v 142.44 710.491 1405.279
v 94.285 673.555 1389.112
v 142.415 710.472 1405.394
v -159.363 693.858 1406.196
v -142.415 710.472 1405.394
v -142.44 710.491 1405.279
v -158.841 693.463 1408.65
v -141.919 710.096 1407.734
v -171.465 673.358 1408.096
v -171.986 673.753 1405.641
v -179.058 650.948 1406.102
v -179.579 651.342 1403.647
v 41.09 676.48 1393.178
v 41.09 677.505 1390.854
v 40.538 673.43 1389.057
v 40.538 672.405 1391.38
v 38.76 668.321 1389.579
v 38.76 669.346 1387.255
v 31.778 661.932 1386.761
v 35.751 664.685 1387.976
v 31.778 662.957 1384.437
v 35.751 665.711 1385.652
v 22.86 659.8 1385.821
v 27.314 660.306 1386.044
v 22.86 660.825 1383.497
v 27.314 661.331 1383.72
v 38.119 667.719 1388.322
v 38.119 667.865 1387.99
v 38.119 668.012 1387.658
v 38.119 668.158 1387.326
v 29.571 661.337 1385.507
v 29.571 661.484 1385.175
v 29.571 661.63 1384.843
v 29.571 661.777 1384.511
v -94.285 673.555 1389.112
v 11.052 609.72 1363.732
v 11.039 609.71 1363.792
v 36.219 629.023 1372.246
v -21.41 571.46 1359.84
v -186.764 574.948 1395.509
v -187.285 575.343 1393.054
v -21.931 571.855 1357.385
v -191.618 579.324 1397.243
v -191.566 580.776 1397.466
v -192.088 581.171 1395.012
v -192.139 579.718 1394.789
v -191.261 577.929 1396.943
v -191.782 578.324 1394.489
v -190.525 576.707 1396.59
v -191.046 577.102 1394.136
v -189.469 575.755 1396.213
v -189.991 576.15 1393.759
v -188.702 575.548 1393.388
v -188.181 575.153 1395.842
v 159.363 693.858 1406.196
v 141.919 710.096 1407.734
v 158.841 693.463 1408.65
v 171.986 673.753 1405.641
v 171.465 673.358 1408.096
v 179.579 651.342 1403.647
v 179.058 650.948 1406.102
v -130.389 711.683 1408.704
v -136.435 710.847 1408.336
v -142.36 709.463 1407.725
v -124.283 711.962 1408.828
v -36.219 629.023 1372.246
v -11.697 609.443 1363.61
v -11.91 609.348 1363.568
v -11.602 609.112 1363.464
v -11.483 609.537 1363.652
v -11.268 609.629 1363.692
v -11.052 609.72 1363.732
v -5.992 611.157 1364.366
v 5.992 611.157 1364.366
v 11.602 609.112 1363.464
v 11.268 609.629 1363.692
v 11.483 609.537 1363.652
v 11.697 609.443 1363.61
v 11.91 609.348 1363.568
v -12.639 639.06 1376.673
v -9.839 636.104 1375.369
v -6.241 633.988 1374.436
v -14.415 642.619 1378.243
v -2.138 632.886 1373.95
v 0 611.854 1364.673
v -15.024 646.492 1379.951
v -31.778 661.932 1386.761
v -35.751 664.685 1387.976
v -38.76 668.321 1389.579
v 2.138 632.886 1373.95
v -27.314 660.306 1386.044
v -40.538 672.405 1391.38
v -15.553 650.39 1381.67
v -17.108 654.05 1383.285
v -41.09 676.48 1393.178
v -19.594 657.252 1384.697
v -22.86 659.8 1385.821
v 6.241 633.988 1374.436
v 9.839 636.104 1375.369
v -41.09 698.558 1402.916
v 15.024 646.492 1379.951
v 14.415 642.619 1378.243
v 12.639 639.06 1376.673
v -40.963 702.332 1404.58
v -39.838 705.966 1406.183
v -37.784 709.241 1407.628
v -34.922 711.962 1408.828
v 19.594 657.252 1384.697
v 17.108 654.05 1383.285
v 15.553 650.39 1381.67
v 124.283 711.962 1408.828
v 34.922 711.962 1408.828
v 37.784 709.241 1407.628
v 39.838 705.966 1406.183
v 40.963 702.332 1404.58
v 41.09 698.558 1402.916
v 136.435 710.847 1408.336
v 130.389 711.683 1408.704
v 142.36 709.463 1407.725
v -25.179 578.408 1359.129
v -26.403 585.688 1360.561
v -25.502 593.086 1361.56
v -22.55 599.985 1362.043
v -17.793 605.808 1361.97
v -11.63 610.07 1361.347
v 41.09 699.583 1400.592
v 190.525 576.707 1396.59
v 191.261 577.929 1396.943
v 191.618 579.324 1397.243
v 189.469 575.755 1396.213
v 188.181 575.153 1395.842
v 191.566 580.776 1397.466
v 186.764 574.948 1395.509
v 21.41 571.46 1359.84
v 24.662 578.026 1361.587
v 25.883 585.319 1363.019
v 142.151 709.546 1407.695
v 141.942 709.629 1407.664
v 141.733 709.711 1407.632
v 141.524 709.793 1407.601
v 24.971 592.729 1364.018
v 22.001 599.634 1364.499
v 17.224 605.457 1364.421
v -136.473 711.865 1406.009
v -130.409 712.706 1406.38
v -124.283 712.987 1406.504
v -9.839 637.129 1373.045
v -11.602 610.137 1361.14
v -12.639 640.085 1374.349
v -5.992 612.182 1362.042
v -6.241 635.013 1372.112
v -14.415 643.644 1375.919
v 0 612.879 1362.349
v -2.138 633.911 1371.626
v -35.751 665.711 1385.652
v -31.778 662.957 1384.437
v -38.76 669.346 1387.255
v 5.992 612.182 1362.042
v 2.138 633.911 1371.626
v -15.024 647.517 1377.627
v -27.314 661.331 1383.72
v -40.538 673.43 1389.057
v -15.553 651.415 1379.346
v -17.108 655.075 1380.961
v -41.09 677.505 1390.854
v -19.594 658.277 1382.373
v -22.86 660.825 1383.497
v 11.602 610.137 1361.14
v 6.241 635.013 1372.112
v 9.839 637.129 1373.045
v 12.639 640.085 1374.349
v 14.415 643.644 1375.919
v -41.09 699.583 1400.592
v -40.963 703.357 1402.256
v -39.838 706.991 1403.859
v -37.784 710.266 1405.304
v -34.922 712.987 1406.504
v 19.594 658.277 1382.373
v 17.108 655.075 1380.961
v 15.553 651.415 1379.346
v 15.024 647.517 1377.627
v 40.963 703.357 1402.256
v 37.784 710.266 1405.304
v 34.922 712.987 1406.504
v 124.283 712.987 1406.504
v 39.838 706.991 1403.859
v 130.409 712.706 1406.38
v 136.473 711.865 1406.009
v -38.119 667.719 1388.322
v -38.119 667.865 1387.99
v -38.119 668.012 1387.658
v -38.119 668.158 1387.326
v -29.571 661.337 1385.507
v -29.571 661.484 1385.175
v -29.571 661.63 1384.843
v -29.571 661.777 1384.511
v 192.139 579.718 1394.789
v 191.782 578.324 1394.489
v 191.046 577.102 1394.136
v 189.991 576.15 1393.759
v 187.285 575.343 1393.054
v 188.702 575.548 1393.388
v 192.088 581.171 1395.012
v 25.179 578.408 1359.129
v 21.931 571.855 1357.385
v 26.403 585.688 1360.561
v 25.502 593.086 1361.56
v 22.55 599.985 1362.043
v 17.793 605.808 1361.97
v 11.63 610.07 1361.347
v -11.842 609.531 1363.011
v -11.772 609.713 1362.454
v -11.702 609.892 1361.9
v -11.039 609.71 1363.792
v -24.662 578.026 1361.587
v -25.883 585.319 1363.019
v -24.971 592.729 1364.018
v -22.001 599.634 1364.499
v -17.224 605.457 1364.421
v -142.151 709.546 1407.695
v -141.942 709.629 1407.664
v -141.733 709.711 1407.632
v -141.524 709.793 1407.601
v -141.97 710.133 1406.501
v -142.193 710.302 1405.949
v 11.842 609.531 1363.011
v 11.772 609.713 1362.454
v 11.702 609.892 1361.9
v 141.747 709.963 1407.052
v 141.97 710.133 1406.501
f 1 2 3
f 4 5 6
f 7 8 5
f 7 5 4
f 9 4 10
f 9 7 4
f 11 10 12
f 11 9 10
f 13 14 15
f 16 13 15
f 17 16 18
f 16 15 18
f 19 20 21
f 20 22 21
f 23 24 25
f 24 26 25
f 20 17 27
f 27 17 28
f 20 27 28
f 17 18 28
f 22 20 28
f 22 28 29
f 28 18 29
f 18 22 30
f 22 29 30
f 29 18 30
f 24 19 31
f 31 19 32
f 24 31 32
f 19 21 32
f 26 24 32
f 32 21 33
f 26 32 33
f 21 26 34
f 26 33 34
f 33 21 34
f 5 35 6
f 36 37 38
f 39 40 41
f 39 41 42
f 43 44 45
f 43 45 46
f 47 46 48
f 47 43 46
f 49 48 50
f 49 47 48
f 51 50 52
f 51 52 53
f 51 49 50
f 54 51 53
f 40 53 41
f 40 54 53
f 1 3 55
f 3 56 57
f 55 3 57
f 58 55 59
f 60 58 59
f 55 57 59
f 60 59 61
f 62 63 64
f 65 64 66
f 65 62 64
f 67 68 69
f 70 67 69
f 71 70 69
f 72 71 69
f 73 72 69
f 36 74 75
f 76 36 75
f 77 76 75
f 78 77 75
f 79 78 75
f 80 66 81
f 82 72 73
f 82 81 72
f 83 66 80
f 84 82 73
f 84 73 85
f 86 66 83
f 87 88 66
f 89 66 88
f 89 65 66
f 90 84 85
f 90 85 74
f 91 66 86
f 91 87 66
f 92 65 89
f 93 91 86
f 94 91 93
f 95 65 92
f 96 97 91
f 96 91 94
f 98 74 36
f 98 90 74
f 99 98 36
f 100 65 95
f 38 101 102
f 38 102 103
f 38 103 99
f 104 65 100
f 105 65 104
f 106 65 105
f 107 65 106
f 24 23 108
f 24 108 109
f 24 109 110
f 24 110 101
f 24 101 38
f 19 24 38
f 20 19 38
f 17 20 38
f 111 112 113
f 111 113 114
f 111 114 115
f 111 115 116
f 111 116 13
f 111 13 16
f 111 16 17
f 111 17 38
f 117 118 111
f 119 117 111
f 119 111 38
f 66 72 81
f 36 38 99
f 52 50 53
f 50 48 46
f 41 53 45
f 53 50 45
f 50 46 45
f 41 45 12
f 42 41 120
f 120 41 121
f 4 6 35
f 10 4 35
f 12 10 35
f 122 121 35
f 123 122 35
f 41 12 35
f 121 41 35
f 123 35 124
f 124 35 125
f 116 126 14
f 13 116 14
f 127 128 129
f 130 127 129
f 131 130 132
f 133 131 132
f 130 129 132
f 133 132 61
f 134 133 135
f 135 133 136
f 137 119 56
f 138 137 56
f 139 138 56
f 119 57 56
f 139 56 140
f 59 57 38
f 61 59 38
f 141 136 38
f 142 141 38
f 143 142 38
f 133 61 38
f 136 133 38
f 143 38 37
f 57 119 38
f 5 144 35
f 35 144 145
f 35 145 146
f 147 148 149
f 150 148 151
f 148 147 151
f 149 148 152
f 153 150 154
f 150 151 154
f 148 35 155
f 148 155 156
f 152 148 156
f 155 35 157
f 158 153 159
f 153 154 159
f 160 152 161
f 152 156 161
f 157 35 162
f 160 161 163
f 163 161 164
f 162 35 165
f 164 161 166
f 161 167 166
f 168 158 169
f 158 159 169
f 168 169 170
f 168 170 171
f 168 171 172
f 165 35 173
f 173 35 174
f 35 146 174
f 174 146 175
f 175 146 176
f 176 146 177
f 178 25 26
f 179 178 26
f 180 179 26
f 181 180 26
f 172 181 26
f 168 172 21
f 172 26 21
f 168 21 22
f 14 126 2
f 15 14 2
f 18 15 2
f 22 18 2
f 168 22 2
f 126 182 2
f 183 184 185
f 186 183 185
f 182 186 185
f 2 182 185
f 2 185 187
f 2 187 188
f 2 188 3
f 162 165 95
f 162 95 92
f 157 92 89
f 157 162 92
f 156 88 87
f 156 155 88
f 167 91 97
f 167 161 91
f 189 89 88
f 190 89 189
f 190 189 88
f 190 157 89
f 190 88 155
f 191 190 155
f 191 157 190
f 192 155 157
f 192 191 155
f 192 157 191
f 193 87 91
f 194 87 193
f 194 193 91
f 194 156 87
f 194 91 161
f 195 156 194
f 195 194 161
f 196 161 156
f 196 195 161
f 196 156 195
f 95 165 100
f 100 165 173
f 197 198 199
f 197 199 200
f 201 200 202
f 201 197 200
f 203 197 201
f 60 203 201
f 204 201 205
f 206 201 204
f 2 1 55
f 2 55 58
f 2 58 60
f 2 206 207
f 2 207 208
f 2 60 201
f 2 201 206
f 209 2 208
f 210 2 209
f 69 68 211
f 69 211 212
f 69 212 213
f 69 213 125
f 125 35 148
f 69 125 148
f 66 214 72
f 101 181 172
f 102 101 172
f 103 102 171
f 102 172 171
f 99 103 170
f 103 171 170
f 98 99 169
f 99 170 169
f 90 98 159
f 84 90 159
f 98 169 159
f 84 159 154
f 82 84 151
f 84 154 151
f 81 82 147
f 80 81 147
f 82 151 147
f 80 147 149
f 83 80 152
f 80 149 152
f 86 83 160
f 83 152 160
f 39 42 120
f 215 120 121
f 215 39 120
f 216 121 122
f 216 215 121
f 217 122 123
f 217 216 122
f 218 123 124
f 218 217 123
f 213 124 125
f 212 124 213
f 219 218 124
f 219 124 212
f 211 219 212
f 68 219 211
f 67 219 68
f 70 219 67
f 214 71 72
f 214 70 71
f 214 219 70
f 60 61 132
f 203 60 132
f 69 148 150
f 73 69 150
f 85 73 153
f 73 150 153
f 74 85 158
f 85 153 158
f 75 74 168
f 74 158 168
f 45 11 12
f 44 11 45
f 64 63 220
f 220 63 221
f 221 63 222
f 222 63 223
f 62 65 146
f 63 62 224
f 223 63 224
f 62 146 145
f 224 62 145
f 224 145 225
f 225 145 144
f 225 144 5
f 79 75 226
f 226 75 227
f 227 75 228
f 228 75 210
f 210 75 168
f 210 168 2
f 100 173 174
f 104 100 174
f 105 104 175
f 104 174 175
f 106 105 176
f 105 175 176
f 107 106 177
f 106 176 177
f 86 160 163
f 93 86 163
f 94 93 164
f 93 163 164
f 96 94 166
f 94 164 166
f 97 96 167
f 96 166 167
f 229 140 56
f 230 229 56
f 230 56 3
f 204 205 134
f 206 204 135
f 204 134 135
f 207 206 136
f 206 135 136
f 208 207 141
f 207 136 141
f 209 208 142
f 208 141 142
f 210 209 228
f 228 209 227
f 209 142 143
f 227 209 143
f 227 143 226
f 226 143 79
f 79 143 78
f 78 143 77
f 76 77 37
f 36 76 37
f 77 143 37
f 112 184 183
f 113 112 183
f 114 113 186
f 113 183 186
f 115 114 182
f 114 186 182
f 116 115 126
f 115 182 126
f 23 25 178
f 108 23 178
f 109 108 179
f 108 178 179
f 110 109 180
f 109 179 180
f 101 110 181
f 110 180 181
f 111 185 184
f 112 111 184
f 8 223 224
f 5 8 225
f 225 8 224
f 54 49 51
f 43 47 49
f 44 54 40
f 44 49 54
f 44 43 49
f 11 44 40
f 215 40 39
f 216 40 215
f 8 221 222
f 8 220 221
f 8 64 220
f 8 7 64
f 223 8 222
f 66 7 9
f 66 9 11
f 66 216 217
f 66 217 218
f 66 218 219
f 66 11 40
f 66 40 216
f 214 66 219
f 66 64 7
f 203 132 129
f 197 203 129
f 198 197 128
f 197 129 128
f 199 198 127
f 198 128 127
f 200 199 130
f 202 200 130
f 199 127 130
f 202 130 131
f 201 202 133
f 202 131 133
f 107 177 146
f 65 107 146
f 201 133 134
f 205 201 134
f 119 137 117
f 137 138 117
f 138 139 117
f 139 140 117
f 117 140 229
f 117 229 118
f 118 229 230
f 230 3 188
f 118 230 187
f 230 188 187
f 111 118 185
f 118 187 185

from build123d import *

# Parameters (mm, degrees)
BOSS_EXTRUDE1_DEPTH = 2.54
BOSS_EXTRUDE2_DEPTH = 2.54


with BuildPart() as part:
    # Sketch1 → Boss-Extrude1 (new body)
    with BuildSketch(Plane(origin=(0, -403.215393304, 914.186019304), x_dir=(1, 0, 0), z_dir=(0, -0.403554778, 0.914955486))):
        with BuildLine():
            Line((41.090457211, 1205.302750155), (41.090457211, 1181.172750155))
            add(Edge.make_bspline(
                [(41.090457211, 1181.172750155), (41.090457211, 1179.500406586), (40.786106444, 1177.855480514), (40.627250629, 1176.996911717), (40.38674257, 1176.156490093), (40.140401941, 1175.295687376), (39.810465838, 1174.462215303), (39.474066056, 1173.612414933), (39.053823577, 1172.79959973), (38.627425101, 1171.974877856), (38.118810853, 1171.196866161), (37.605369582, 1170.411470717), (37.013273567, 1169.682127132), (36.418695318, 1168.949725934), (35.750879918, 1168.281870238), (35.083841269, 1167.614791339), (34.350623023, 1167.019476589), (33.622163357, 1166.428025426), (32.835883994, 1165.913939303), (32.058807597, 1165.405870274), (31.233150426, 1164.978926578), (30.421305456, 1164.559125111), (29.570534852, 1164.222284318), (28.738051446, 1163.892683872), (27.876260062, 1163.646007586), (27.036829788, 1163.40573187), (26.177269641, 1163.246643712), (24.532849383, 1162.942292945), (22.86, 1162.942292945)],
                knots=[0, 0, 0, 0.125, 0.125, 0.1875, 0.1875, 0.25, 0.25, 0.3125, 0.3125, 0.375, 0.375, 0.4375, 0.4375, 0.5, 0.5, 0.5625, 0.5625, 0.625, 0.625, 0.6875, 0.6875, 0.75, 0.75, 0.8125, 0.8125, 0.875, 0.875, 1, 1, 1], degree=2))
            ThreePointArc((22.86, 1162.942292945), (17.107545571, 1156.658209277), (15.02386871, 1148.397535561))
            ThreePointArc((15.02386871, 1148.397535561), (0, 1133.373666883), (-15.02386871, 1148.397535561))
            ThreePointArc((-15.02386871, 1148.397535561), (-17.107545571, 1156.658209277), (-22.86, 1162.942292945))
            add(Edge.make_bspline(
                [(-41.090457211, 1181.172750155), (-41.090457211, 1179.500406586), (-40.786106444, 1177.855480514), (-40.627250629, 1176.996911717), (-40.38674257, 1176.156490093), (-40.140401941, 1175.295687376), (-39.810465838, 1174.462215303), (-39.474066056, 1173.612414933), (-39.053823577, 1172.79959973), (-38.627425101, 1171.974877856), (-38.118810853, 1171.196866161), (-37.605369582, 1170.411470717), (-37.013273567, 1169.682127132), (-36.418695318, 1168.949725934), (-35.750879918, 1168.281870238), (-35.083841269, 1167.614791339), (-34.350623023, 1167.019476589), (-33.622163357, 1166.428025426), (-32.835883994, 1165.913939303), (-32.058807597, 1165.405870274), (-31.233150426, 1164.978926578), (-30.421305456, 1164.559125111), (-29.570534852, 1164.222284318), (-28.738051446, 1163.892683872), (-27.876260062, 1163.646007586), (-27.036829788, 1163.40573187), (-26.177269641, 1163.246643712), (-24.532849383, 1162.942292945), (-22.86, 1162.942292945)],
                knots=[0, 0, 0, 0.125, 0.125, 0.1875, 0.1875, 0.25, 0.25, 0.3125, 0.3125, 0.375, 0.375, 0.4375, 0.4375, 0.5, 0.5, 0.5625, 0.5625, 0.625, 0.625, 0.6875, 0.6875, 0.75, 0.75, 0.8125, 0.8125, 0.875, 0.875, 1, 1, 1], degree=2))
            Line((-41.090457211, 1181.172750155), (-41.090457211, 1205.302750155))
            ThreePointArc((-41.090457211, 1205.302750155), (-39.838195765, 1213.399088759), (-34.922129755, 1219.952801638))
            Line((-34.922129755, 1219.952801638), (-124.282704843, 1219.952801638))
            ThreePointArc((-124.282704843, 1219.952801638), (-133.452528355, 1219.261665344), (-142.415163066, 1217.203872436))
            Line((-142.415163066, 1217.203872436), (-11.602437283, 1107.542547866))
            ThreePointArc((-11.602437283, 1107.542547866), (0, 1110.539391573), (11.602437283, 1107.542547866))
            Line((11.602437283, 1107.542547866), (142.415163066, 1217.203872436))
            ThreePointArc((142.415163066, 1217.203872436), (133.452528355, 1219.261665344), (124.282704843, 1219.952801638))
            Line((124.282704843, 1219.952801638), (34.922129755, 1219.952801638))
            ThreePointArc((34.922129755, 1219.952801638), (39.838195765, 1213.399088759), (41.090457211, 1205.302750155))
        make_face()
    boss_extrude1 = extrude(amount=BOSS_EXTRUDE1_DEPTH)


with BuildPart() as body_2:
    # Sketch2 → Boss-Extrude2 (new body)
    with BuildSketch(Plane(origin=(250.456709511, -189.811186969, 1179.622087881), x_dir=(-0.978727634, -0.032622557, 0.202553664), z_dir=(-0.205163879, 0.155485551, -0.966298104))):
        with BuildLine():
            Line((438.824397172, 866.073971669), (451.606917208, 795.421913218))
            ThreePointArc((451.606917208, 795.421913218), (450.542773626, 791.265264069), (446.699876764, 789.356788913))
            Line((446.699876764, 789.356788913), (277.752918196, 780.24161181))
            ThreePointArc((277.752918196, 780.24161181), (281.389861334, 801.904197312), (267.155321643, 818.633597954))
            Line((267.155321643, 818.633597954), (400.876040527, 924.729024753))
            ThreePointArc((400.876040527, 924.729024753), (425.219058104, 898.875003324), (438.824397172, 866.073971669))
        make_face()
    boss_extrude2 = extrude(amount=BOSS_EXTRUDE2_DEPTH)


with BuildPart() as part_1:
    add(part.part)

    add(body_2.part)  # Mirror7 merges body 2
    # Mirror7: Boss-Extrude1, Boss-Extrude2 across plane
    add(boss_extrude1.mirror(Plane(origin=(0, 0, 0), x_dir=(0, 0, 1), z_dir=(1, 0, 0))))
    add(boss_extrude2.mirror(Plane(origin=(0, 0, 0), x_dir=(0, 0, 1), z_dir=(1, 0, 0))))


solid = part_1.part
